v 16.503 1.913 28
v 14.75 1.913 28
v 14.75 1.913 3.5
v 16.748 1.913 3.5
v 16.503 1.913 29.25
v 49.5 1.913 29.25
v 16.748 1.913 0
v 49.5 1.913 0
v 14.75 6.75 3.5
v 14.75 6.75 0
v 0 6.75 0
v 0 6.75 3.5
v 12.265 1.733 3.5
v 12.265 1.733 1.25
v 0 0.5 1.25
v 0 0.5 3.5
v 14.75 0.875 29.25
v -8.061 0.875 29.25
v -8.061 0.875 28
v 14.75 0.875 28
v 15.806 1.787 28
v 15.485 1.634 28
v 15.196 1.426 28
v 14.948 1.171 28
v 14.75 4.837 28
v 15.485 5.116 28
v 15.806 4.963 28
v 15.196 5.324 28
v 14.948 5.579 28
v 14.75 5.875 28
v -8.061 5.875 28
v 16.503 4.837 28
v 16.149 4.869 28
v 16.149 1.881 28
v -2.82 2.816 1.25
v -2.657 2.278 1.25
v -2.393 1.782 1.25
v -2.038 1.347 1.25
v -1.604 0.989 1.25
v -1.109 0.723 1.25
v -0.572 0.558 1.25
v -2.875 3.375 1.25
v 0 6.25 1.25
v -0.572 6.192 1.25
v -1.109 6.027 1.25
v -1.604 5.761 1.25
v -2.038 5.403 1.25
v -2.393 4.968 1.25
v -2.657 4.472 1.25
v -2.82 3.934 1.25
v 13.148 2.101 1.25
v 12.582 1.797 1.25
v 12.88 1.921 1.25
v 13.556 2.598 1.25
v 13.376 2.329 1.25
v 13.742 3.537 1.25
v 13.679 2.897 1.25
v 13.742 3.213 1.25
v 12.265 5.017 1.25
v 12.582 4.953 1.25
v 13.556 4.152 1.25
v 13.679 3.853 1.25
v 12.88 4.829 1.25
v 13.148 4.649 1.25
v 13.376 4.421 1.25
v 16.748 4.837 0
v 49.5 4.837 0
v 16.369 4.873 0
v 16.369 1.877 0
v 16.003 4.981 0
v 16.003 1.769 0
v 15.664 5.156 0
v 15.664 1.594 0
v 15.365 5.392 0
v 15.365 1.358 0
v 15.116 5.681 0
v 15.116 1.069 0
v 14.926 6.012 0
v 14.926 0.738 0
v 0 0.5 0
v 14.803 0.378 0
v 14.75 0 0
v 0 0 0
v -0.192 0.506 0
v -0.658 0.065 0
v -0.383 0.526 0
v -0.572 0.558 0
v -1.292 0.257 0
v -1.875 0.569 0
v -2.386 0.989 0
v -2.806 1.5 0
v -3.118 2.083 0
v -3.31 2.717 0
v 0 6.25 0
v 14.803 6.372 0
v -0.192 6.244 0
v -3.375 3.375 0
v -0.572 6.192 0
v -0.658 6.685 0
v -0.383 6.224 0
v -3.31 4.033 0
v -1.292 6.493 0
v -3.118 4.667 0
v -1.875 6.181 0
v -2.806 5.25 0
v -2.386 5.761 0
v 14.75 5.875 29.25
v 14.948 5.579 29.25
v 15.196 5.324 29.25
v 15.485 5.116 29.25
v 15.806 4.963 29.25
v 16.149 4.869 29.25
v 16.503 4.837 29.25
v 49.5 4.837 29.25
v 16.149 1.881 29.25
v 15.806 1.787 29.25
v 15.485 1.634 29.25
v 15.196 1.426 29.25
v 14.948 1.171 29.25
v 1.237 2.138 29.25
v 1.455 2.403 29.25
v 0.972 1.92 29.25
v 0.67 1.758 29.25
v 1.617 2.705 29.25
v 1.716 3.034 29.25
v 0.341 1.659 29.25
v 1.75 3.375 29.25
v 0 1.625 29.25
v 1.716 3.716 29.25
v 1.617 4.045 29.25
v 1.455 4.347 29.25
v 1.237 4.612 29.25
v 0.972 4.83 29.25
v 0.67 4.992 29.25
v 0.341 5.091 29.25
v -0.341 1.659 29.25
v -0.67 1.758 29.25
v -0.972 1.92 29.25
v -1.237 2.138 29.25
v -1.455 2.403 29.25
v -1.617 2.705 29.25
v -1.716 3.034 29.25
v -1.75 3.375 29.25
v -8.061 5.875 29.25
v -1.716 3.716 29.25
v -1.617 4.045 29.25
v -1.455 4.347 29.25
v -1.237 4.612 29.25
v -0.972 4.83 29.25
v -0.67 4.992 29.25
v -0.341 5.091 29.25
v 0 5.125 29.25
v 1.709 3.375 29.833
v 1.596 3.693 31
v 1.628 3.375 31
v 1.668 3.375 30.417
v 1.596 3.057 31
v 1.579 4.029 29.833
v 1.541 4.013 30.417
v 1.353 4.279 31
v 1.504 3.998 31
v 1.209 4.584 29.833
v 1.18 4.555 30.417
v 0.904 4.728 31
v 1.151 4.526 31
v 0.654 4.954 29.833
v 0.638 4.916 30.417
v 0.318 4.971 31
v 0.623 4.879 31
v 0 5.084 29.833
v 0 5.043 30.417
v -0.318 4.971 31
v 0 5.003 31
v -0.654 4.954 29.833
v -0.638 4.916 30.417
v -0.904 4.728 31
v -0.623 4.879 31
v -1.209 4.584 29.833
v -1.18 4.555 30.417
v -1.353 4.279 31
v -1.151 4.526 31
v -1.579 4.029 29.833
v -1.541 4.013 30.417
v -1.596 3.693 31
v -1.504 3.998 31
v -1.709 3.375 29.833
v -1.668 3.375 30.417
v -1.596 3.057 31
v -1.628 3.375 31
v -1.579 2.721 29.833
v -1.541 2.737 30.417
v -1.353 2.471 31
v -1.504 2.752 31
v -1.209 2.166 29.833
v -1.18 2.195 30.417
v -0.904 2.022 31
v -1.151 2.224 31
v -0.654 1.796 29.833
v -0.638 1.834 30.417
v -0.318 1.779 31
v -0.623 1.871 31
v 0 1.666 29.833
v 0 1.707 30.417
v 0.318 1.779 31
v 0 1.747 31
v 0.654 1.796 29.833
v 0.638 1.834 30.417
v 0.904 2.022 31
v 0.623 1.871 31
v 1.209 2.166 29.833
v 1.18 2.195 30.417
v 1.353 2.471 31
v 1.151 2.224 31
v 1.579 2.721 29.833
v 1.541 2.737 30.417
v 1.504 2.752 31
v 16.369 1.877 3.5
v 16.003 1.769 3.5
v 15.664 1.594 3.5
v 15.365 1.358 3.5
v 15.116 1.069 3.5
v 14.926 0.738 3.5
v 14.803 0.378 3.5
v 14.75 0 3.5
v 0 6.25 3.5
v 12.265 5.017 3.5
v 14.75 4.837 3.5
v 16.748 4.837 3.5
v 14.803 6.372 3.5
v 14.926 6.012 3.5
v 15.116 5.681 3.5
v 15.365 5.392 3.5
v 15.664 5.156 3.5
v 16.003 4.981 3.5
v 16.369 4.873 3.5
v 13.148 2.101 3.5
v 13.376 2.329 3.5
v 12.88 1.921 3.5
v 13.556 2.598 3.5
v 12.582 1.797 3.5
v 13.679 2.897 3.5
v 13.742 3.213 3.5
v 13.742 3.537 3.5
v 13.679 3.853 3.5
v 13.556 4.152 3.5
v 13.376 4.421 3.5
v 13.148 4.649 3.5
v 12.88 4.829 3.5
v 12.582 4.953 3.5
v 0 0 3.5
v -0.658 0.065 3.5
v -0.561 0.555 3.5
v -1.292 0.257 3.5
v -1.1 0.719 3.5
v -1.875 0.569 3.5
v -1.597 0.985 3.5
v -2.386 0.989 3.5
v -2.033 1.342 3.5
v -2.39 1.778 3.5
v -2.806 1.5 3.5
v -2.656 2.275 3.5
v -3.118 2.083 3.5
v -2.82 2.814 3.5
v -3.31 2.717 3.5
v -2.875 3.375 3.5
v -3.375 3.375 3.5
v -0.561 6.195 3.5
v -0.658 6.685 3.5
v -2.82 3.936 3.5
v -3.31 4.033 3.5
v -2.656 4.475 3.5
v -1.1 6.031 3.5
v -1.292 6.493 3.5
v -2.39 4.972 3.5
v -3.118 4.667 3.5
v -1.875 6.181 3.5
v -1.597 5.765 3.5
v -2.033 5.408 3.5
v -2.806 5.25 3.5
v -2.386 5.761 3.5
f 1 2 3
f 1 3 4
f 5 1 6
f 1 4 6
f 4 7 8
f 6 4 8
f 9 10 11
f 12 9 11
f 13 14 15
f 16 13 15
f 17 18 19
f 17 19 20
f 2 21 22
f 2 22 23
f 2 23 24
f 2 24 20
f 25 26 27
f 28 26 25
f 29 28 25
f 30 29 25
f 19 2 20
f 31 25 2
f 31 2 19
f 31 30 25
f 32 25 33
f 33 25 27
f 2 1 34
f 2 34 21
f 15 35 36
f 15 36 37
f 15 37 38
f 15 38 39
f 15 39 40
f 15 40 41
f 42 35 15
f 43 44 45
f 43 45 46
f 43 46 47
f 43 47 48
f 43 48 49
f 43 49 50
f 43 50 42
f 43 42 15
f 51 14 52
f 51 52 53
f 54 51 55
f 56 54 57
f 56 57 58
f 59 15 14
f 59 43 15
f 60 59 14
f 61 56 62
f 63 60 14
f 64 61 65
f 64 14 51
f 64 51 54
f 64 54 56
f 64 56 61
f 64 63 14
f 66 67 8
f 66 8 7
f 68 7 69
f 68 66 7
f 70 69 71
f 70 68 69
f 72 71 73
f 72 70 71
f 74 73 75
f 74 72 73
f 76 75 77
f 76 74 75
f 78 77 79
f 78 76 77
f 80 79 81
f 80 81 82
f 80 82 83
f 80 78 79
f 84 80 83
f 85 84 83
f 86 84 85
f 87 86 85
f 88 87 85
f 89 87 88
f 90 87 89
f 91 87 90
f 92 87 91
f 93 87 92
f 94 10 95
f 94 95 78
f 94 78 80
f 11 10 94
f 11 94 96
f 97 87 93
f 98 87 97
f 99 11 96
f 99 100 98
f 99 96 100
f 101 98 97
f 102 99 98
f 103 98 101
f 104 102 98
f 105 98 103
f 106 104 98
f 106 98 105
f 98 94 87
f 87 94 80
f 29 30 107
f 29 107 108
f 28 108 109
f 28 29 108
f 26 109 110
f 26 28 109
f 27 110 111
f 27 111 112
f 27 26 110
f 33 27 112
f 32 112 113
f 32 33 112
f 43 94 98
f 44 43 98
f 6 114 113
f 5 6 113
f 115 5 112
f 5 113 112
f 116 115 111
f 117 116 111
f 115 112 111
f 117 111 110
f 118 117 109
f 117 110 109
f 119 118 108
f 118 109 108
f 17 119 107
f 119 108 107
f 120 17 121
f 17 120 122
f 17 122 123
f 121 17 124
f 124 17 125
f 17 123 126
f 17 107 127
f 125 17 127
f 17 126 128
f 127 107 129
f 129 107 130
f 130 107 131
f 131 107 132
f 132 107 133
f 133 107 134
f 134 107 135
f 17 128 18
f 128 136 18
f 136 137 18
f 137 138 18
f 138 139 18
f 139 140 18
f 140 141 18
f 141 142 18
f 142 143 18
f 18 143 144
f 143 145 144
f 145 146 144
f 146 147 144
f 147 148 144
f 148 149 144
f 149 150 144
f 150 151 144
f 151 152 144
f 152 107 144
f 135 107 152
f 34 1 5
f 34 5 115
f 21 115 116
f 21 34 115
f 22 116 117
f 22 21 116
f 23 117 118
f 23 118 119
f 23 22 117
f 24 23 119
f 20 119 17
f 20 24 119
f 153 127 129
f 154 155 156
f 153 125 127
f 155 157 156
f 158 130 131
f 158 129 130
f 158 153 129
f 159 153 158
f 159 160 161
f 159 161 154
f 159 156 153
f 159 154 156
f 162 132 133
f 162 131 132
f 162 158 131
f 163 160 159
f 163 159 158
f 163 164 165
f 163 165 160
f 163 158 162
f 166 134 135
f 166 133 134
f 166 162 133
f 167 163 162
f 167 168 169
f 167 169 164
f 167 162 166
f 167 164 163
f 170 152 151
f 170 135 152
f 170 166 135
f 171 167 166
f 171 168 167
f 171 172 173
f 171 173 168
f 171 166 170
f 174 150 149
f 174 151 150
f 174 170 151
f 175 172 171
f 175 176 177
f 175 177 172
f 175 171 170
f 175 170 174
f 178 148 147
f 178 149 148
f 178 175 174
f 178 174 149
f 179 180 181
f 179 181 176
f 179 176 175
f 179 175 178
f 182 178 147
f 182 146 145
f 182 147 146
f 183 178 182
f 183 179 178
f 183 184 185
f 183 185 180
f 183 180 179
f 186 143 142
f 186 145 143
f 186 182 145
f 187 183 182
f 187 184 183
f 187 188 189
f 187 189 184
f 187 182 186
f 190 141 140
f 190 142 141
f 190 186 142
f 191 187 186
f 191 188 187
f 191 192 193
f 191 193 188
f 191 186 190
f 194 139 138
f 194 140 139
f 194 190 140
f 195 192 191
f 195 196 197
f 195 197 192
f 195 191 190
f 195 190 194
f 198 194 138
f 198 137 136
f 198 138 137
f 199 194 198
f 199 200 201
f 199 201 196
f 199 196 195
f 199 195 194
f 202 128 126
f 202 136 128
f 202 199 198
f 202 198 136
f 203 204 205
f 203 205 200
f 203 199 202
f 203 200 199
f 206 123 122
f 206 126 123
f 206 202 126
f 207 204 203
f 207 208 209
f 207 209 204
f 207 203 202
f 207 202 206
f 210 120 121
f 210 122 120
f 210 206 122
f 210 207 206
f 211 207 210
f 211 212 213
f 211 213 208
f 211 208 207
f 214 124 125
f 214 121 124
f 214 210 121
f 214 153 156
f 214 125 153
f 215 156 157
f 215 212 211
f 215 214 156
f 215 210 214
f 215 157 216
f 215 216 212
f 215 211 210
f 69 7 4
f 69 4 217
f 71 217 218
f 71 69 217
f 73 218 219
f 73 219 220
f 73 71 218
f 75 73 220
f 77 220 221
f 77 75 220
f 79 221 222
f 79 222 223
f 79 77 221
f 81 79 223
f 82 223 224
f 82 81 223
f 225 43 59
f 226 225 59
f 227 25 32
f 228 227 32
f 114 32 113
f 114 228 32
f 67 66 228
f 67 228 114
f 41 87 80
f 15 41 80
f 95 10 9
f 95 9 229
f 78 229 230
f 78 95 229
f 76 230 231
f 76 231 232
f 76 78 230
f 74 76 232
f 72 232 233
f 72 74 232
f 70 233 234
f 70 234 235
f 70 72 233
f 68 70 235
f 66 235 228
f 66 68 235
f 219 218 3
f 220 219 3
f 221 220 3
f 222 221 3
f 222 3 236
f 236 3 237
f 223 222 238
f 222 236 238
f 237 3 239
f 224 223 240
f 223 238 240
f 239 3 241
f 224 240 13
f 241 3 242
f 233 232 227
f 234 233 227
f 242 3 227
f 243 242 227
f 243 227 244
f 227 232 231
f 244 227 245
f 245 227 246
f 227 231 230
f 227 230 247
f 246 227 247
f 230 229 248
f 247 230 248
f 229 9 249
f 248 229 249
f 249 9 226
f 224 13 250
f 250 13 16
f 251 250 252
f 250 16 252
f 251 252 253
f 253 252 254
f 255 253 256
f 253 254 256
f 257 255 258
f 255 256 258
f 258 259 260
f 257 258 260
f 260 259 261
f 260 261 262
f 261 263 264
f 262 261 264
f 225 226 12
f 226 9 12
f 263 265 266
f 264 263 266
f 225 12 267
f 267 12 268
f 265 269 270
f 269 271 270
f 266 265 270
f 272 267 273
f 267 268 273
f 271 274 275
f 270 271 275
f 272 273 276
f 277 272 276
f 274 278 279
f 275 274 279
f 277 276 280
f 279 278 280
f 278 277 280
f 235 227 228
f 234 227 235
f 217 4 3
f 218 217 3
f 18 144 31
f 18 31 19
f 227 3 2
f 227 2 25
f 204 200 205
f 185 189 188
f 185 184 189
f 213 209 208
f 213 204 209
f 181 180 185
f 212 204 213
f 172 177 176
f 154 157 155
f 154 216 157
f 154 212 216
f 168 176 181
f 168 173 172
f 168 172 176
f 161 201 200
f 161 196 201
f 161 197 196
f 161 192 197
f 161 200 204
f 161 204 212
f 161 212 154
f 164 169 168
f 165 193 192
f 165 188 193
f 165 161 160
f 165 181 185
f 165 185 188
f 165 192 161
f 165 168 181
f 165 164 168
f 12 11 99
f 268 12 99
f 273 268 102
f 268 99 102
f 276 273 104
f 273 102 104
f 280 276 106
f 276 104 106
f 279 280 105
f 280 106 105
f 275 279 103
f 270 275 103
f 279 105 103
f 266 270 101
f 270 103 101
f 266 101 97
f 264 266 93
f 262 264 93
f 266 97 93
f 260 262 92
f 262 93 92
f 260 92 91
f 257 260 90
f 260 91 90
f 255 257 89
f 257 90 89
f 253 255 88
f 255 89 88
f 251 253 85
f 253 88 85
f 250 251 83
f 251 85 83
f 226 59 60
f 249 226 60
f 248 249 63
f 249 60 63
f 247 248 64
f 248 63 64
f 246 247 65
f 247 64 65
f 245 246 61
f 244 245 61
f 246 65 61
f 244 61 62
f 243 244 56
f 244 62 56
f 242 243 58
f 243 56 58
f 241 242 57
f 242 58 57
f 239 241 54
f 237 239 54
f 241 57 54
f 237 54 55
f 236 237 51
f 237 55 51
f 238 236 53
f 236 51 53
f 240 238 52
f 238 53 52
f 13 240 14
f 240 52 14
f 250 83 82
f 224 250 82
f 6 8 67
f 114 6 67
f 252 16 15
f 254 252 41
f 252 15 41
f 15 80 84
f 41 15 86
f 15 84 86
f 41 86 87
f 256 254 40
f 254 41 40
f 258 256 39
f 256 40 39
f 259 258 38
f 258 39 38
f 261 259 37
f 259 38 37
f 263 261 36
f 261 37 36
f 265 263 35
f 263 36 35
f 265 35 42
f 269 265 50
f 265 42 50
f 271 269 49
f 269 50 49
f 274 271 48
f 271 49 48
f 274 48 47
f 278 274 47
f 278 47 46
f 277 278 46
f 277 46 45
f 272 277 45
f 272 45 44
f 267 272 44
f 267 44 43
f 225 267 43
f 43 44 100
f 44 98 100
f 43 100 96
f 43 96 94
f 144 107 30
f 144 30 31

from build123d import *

# Parameters (mm, degrees)
BOSS_EXTRUDE10_DEPTH = 3.5
BOSS_EXTRUDE15_DEPTH = 1.25
SKETCH1_17_W         = 34.75
SKETCH1_17_H         = 2.924143722
BOSS_EXTRUDE17_DEPTH = 29.25
BOSS_EXTRUDE18_DEPTH = 1.25
SKETCH2_9_R          = 1.75
BOSS_EXTRUDE19_DEPTH = 1.75
BOSS_EXTRUDE19_TAPER = 4
FILLET1_R            = 2


with BuildPart() as part:
    # Sketch1 → Boss-Extrude10 (new body)
    with BuildSketch(Plane.XY):
        with BuildLine():
            ThreePointArc((0, 6.75), (-3.375, 3.375), (0, 0))
            Line((0, 0), (14.75, 0))
            Line((14.75, 0), (14.75, 6.75))
            Line((14.75, 6.75), (0, 6.75))
        make_face()
        with BuildLine():
            ThreePointArc((0, 0.5), (-2.875, 3.375), (0, 6.25))
            Line((0, 6.25), (12.265078429, 5.016721387))
            ThreePointArc((12.265078429, 5.016721387), (13.75, 3.375), (12.265078429, 1.733278613))
            Line((12.265078429, 1.733278613), (0, 0.5))
        make_face(mode=Mode.SUBTRACT)
    extrude(amount=BOSS_EXTRUDE10_DEPTH)

    # Sketch1<16> → Boss-Extrude15 (add)
    with BuildSketch(Plane.XY):
        with BuildLine():
            Line((0, 6.25), (-0.57238697, 6.192445325))
            ThreePointArc((-0.57238697, 6.192445325), (-2.875, 3.375), (-0.57238697, 0.557554675))
            Line((-0.57238697, 0.557554675), (0, 0.5))
            Line((0, 0.5), (12.265078429, 1.733278613))
            ThreePointArc((12.265078429, 1.733278613), (13.75, 3.375), (12.265078429, 5.016721387))
            Line((12.265078429, 5.016721387), (0, 6.25))
        make_face()
    extrude(amount=BOSS_EXTRUDE15_DEPTH)

    # Sketch1<17> → Boss-Extrude17 (add)
    with BuildSketch(Plane.XY):
        with Locations((32.125, 3.375)):
            Rectangle(SKETCH1_17_W, SKETCH1_17_H)
    extrude(amount=BOSS_EXTRUDE17_DEPTH)

    # Sketch2 → Boss-Extrude18 (add)
    with BuildSketch(Plane.XY.offset(29.25)):
        Polygon((13.5, 5.875), (-8.061356684, 5.875), (-8.061356684, 0.875), (14.75, 0.875), (14.75, 5.875), align=None)
    extrude(amount=-BOSS_EXTRUDE18_DEPTH)

    # Sketch2<9> → Boss-Extrude19 (add)
    with BuildSketch(Plane.XY.offset(29.25)):
        with Locations((0, 3.375)):
            Circle(SKETCH2_9_R)
    extrude(amount=BOSS_EXTRUDE19_DEPTH, taper=BOSS_EXTRUDE19_TAPER)

    # Fillet1
    # the kernel refuses this fillet: 2 mm, written as the material it adds along each edge
    with BuildSketch(Plane(origin=(14.75, 1.912928139, 0), x_dir=(0, -1, 0), z_dir=(0, 0, 1))) as fillet1_piece_1:
        with BuildLine():
            CenterArc((2, 1.998103724), FILLET1_R, 180, 87.504786267)
            Line((0, 1.998103724), (0, 0))
            Line((0, 0), (1.912928139, 0))
        make_face()
    extrude(amount=3.5)
    with BuildSketch(Plane(origin=(14.75, 4.837071861, 0), x_dir=(1, 0, 0), z_dir=(0, 0, 1))) as fillet1_piece_2:
        with BuildLine():
            CenterArc((1.998103724, 2), FILLET1_R, 182.495213733, 87.504786267)
            Line((0, 1.912928139), (0, 0))
            Line((0, 0), (1.998103724, 0))
        make_face()
    extrude(amount=3.5)
    with BuildSketch(Plane(origin=(14.75, 1.912928139, 28), x_dir=(1, 0, 0), z_dir=(0, 0, 1))) as fillet1_piece_3:
        with BuildLine():
            CenterArc((1.753401761, -2), FILLET1_R, 90, 61.246917848)
            Line((0, -1.037928139), (0, 0))
            Line((0, 0), (1.753401761, 0))
        make_face()
    extrude(amount=1.25)
    with BuildSketch(Plane(origin=(14.75, 4.837071861, 28), x_dir=(1, 0, 0), z_dir=(0, 0, 1))) as fillet1_piece_4:
        with BuildLine():
            CenterArc((1.753401761, 2), FILLET1_R, 208.753082152, 61.246917848)
            Line((0, 1.037928139), (0, 0))
            Line((0, 0), (1.753401761, 0))
        make_face()
    extrude(amount=1.25)


solid = part.part
